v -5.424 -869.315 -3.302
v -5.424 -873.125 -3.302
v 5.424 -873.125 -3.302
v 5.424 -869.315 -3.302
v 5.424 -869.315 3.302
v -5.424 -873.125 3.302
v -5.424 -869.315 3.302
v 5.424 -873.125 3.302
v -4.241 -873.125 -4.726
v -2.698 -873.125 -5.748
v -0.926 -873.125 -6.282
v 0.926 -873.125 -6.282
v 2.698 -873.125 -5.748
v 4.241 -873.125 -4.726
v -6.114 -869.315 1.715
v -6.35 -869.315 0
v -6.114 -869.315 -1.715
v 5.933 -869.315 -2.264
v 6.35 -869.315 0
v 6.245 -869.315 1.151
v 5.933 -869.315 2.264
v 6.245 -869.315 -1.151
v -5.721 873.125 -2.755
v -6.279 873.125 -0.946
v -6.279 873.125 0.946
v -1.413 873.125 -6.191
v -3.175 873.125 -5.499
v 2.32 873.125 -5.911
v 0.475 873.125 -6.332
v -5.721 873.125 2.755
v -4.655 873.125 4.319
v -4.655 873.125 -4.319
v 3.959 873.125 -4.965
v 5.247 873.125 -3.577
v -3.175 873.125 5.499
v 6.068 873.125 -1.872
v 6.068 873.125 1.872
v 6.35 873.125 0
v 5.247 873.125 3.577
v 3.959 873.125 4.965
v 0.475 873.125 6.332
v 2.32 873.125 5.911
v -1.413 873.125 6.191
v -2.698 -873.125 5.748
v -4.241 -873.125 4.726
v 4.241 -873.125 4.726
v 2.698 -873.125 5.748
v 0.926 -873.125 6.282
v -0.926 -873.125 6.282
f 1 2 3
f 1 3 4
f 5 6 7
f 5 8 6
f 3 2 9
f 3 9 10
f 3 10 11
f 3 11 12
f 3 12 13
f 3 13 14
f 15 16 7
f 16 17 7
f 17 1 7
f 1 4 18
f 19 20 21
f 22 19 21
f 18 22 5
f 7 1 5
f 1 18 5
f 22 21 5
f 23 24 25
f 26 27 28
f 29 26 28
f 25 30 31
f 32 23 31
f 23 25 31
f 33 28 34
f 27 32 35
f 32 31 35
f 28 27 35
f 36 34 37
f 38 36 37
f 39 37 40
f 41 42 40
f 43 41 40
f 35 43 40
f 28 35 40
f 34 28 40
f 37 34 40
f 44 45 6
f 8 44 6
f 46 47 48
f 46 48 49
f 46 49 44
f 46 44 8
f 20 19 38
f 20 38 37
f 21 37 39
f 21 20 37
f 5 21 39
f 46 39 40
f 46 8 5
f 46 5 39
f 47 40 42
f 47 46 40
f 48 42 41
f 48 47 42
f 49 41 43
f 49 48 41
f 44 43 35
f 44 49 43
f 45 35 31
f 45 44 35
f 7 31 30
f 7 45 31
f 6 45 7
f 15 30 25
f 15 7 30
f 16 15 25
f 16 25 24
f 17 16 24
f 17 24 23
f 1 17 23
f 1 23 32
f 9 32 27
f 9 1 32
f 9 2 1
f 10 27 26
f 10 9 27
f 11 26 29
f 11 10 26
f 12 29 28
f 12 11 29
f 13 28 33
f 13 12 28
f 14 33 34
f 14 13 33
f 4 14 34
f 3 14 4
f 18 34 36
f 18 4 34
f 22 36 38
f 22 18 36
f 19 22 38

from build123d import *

# Parameters (mm, degrees)
F0_R     = 6.35
F1_DEPTH = 873.125
F2_W     = 6.6555930256
F2_H     = 6.604
F3_DEPTH = 12.7


with BuildPart() as f1:
    # F0 (on Front) → F1 (new body, symmetric)
    with BuildSketch(Plane.XZ):
        Circle(F0_R)
    extrude(amount=F1_DEPTH, both=True)

    # F2 (on Right) → F3 (cut, symmetric)
    with BuildSketch(Plane.YZ):
        with Locations((-872.6427965128, 0)):
            Rectangle(F2_W, F2_H)
    extrude(amount=F3_DEPTH, both=True, mode=Mode.SUBTRACT)


solid = f1.part
